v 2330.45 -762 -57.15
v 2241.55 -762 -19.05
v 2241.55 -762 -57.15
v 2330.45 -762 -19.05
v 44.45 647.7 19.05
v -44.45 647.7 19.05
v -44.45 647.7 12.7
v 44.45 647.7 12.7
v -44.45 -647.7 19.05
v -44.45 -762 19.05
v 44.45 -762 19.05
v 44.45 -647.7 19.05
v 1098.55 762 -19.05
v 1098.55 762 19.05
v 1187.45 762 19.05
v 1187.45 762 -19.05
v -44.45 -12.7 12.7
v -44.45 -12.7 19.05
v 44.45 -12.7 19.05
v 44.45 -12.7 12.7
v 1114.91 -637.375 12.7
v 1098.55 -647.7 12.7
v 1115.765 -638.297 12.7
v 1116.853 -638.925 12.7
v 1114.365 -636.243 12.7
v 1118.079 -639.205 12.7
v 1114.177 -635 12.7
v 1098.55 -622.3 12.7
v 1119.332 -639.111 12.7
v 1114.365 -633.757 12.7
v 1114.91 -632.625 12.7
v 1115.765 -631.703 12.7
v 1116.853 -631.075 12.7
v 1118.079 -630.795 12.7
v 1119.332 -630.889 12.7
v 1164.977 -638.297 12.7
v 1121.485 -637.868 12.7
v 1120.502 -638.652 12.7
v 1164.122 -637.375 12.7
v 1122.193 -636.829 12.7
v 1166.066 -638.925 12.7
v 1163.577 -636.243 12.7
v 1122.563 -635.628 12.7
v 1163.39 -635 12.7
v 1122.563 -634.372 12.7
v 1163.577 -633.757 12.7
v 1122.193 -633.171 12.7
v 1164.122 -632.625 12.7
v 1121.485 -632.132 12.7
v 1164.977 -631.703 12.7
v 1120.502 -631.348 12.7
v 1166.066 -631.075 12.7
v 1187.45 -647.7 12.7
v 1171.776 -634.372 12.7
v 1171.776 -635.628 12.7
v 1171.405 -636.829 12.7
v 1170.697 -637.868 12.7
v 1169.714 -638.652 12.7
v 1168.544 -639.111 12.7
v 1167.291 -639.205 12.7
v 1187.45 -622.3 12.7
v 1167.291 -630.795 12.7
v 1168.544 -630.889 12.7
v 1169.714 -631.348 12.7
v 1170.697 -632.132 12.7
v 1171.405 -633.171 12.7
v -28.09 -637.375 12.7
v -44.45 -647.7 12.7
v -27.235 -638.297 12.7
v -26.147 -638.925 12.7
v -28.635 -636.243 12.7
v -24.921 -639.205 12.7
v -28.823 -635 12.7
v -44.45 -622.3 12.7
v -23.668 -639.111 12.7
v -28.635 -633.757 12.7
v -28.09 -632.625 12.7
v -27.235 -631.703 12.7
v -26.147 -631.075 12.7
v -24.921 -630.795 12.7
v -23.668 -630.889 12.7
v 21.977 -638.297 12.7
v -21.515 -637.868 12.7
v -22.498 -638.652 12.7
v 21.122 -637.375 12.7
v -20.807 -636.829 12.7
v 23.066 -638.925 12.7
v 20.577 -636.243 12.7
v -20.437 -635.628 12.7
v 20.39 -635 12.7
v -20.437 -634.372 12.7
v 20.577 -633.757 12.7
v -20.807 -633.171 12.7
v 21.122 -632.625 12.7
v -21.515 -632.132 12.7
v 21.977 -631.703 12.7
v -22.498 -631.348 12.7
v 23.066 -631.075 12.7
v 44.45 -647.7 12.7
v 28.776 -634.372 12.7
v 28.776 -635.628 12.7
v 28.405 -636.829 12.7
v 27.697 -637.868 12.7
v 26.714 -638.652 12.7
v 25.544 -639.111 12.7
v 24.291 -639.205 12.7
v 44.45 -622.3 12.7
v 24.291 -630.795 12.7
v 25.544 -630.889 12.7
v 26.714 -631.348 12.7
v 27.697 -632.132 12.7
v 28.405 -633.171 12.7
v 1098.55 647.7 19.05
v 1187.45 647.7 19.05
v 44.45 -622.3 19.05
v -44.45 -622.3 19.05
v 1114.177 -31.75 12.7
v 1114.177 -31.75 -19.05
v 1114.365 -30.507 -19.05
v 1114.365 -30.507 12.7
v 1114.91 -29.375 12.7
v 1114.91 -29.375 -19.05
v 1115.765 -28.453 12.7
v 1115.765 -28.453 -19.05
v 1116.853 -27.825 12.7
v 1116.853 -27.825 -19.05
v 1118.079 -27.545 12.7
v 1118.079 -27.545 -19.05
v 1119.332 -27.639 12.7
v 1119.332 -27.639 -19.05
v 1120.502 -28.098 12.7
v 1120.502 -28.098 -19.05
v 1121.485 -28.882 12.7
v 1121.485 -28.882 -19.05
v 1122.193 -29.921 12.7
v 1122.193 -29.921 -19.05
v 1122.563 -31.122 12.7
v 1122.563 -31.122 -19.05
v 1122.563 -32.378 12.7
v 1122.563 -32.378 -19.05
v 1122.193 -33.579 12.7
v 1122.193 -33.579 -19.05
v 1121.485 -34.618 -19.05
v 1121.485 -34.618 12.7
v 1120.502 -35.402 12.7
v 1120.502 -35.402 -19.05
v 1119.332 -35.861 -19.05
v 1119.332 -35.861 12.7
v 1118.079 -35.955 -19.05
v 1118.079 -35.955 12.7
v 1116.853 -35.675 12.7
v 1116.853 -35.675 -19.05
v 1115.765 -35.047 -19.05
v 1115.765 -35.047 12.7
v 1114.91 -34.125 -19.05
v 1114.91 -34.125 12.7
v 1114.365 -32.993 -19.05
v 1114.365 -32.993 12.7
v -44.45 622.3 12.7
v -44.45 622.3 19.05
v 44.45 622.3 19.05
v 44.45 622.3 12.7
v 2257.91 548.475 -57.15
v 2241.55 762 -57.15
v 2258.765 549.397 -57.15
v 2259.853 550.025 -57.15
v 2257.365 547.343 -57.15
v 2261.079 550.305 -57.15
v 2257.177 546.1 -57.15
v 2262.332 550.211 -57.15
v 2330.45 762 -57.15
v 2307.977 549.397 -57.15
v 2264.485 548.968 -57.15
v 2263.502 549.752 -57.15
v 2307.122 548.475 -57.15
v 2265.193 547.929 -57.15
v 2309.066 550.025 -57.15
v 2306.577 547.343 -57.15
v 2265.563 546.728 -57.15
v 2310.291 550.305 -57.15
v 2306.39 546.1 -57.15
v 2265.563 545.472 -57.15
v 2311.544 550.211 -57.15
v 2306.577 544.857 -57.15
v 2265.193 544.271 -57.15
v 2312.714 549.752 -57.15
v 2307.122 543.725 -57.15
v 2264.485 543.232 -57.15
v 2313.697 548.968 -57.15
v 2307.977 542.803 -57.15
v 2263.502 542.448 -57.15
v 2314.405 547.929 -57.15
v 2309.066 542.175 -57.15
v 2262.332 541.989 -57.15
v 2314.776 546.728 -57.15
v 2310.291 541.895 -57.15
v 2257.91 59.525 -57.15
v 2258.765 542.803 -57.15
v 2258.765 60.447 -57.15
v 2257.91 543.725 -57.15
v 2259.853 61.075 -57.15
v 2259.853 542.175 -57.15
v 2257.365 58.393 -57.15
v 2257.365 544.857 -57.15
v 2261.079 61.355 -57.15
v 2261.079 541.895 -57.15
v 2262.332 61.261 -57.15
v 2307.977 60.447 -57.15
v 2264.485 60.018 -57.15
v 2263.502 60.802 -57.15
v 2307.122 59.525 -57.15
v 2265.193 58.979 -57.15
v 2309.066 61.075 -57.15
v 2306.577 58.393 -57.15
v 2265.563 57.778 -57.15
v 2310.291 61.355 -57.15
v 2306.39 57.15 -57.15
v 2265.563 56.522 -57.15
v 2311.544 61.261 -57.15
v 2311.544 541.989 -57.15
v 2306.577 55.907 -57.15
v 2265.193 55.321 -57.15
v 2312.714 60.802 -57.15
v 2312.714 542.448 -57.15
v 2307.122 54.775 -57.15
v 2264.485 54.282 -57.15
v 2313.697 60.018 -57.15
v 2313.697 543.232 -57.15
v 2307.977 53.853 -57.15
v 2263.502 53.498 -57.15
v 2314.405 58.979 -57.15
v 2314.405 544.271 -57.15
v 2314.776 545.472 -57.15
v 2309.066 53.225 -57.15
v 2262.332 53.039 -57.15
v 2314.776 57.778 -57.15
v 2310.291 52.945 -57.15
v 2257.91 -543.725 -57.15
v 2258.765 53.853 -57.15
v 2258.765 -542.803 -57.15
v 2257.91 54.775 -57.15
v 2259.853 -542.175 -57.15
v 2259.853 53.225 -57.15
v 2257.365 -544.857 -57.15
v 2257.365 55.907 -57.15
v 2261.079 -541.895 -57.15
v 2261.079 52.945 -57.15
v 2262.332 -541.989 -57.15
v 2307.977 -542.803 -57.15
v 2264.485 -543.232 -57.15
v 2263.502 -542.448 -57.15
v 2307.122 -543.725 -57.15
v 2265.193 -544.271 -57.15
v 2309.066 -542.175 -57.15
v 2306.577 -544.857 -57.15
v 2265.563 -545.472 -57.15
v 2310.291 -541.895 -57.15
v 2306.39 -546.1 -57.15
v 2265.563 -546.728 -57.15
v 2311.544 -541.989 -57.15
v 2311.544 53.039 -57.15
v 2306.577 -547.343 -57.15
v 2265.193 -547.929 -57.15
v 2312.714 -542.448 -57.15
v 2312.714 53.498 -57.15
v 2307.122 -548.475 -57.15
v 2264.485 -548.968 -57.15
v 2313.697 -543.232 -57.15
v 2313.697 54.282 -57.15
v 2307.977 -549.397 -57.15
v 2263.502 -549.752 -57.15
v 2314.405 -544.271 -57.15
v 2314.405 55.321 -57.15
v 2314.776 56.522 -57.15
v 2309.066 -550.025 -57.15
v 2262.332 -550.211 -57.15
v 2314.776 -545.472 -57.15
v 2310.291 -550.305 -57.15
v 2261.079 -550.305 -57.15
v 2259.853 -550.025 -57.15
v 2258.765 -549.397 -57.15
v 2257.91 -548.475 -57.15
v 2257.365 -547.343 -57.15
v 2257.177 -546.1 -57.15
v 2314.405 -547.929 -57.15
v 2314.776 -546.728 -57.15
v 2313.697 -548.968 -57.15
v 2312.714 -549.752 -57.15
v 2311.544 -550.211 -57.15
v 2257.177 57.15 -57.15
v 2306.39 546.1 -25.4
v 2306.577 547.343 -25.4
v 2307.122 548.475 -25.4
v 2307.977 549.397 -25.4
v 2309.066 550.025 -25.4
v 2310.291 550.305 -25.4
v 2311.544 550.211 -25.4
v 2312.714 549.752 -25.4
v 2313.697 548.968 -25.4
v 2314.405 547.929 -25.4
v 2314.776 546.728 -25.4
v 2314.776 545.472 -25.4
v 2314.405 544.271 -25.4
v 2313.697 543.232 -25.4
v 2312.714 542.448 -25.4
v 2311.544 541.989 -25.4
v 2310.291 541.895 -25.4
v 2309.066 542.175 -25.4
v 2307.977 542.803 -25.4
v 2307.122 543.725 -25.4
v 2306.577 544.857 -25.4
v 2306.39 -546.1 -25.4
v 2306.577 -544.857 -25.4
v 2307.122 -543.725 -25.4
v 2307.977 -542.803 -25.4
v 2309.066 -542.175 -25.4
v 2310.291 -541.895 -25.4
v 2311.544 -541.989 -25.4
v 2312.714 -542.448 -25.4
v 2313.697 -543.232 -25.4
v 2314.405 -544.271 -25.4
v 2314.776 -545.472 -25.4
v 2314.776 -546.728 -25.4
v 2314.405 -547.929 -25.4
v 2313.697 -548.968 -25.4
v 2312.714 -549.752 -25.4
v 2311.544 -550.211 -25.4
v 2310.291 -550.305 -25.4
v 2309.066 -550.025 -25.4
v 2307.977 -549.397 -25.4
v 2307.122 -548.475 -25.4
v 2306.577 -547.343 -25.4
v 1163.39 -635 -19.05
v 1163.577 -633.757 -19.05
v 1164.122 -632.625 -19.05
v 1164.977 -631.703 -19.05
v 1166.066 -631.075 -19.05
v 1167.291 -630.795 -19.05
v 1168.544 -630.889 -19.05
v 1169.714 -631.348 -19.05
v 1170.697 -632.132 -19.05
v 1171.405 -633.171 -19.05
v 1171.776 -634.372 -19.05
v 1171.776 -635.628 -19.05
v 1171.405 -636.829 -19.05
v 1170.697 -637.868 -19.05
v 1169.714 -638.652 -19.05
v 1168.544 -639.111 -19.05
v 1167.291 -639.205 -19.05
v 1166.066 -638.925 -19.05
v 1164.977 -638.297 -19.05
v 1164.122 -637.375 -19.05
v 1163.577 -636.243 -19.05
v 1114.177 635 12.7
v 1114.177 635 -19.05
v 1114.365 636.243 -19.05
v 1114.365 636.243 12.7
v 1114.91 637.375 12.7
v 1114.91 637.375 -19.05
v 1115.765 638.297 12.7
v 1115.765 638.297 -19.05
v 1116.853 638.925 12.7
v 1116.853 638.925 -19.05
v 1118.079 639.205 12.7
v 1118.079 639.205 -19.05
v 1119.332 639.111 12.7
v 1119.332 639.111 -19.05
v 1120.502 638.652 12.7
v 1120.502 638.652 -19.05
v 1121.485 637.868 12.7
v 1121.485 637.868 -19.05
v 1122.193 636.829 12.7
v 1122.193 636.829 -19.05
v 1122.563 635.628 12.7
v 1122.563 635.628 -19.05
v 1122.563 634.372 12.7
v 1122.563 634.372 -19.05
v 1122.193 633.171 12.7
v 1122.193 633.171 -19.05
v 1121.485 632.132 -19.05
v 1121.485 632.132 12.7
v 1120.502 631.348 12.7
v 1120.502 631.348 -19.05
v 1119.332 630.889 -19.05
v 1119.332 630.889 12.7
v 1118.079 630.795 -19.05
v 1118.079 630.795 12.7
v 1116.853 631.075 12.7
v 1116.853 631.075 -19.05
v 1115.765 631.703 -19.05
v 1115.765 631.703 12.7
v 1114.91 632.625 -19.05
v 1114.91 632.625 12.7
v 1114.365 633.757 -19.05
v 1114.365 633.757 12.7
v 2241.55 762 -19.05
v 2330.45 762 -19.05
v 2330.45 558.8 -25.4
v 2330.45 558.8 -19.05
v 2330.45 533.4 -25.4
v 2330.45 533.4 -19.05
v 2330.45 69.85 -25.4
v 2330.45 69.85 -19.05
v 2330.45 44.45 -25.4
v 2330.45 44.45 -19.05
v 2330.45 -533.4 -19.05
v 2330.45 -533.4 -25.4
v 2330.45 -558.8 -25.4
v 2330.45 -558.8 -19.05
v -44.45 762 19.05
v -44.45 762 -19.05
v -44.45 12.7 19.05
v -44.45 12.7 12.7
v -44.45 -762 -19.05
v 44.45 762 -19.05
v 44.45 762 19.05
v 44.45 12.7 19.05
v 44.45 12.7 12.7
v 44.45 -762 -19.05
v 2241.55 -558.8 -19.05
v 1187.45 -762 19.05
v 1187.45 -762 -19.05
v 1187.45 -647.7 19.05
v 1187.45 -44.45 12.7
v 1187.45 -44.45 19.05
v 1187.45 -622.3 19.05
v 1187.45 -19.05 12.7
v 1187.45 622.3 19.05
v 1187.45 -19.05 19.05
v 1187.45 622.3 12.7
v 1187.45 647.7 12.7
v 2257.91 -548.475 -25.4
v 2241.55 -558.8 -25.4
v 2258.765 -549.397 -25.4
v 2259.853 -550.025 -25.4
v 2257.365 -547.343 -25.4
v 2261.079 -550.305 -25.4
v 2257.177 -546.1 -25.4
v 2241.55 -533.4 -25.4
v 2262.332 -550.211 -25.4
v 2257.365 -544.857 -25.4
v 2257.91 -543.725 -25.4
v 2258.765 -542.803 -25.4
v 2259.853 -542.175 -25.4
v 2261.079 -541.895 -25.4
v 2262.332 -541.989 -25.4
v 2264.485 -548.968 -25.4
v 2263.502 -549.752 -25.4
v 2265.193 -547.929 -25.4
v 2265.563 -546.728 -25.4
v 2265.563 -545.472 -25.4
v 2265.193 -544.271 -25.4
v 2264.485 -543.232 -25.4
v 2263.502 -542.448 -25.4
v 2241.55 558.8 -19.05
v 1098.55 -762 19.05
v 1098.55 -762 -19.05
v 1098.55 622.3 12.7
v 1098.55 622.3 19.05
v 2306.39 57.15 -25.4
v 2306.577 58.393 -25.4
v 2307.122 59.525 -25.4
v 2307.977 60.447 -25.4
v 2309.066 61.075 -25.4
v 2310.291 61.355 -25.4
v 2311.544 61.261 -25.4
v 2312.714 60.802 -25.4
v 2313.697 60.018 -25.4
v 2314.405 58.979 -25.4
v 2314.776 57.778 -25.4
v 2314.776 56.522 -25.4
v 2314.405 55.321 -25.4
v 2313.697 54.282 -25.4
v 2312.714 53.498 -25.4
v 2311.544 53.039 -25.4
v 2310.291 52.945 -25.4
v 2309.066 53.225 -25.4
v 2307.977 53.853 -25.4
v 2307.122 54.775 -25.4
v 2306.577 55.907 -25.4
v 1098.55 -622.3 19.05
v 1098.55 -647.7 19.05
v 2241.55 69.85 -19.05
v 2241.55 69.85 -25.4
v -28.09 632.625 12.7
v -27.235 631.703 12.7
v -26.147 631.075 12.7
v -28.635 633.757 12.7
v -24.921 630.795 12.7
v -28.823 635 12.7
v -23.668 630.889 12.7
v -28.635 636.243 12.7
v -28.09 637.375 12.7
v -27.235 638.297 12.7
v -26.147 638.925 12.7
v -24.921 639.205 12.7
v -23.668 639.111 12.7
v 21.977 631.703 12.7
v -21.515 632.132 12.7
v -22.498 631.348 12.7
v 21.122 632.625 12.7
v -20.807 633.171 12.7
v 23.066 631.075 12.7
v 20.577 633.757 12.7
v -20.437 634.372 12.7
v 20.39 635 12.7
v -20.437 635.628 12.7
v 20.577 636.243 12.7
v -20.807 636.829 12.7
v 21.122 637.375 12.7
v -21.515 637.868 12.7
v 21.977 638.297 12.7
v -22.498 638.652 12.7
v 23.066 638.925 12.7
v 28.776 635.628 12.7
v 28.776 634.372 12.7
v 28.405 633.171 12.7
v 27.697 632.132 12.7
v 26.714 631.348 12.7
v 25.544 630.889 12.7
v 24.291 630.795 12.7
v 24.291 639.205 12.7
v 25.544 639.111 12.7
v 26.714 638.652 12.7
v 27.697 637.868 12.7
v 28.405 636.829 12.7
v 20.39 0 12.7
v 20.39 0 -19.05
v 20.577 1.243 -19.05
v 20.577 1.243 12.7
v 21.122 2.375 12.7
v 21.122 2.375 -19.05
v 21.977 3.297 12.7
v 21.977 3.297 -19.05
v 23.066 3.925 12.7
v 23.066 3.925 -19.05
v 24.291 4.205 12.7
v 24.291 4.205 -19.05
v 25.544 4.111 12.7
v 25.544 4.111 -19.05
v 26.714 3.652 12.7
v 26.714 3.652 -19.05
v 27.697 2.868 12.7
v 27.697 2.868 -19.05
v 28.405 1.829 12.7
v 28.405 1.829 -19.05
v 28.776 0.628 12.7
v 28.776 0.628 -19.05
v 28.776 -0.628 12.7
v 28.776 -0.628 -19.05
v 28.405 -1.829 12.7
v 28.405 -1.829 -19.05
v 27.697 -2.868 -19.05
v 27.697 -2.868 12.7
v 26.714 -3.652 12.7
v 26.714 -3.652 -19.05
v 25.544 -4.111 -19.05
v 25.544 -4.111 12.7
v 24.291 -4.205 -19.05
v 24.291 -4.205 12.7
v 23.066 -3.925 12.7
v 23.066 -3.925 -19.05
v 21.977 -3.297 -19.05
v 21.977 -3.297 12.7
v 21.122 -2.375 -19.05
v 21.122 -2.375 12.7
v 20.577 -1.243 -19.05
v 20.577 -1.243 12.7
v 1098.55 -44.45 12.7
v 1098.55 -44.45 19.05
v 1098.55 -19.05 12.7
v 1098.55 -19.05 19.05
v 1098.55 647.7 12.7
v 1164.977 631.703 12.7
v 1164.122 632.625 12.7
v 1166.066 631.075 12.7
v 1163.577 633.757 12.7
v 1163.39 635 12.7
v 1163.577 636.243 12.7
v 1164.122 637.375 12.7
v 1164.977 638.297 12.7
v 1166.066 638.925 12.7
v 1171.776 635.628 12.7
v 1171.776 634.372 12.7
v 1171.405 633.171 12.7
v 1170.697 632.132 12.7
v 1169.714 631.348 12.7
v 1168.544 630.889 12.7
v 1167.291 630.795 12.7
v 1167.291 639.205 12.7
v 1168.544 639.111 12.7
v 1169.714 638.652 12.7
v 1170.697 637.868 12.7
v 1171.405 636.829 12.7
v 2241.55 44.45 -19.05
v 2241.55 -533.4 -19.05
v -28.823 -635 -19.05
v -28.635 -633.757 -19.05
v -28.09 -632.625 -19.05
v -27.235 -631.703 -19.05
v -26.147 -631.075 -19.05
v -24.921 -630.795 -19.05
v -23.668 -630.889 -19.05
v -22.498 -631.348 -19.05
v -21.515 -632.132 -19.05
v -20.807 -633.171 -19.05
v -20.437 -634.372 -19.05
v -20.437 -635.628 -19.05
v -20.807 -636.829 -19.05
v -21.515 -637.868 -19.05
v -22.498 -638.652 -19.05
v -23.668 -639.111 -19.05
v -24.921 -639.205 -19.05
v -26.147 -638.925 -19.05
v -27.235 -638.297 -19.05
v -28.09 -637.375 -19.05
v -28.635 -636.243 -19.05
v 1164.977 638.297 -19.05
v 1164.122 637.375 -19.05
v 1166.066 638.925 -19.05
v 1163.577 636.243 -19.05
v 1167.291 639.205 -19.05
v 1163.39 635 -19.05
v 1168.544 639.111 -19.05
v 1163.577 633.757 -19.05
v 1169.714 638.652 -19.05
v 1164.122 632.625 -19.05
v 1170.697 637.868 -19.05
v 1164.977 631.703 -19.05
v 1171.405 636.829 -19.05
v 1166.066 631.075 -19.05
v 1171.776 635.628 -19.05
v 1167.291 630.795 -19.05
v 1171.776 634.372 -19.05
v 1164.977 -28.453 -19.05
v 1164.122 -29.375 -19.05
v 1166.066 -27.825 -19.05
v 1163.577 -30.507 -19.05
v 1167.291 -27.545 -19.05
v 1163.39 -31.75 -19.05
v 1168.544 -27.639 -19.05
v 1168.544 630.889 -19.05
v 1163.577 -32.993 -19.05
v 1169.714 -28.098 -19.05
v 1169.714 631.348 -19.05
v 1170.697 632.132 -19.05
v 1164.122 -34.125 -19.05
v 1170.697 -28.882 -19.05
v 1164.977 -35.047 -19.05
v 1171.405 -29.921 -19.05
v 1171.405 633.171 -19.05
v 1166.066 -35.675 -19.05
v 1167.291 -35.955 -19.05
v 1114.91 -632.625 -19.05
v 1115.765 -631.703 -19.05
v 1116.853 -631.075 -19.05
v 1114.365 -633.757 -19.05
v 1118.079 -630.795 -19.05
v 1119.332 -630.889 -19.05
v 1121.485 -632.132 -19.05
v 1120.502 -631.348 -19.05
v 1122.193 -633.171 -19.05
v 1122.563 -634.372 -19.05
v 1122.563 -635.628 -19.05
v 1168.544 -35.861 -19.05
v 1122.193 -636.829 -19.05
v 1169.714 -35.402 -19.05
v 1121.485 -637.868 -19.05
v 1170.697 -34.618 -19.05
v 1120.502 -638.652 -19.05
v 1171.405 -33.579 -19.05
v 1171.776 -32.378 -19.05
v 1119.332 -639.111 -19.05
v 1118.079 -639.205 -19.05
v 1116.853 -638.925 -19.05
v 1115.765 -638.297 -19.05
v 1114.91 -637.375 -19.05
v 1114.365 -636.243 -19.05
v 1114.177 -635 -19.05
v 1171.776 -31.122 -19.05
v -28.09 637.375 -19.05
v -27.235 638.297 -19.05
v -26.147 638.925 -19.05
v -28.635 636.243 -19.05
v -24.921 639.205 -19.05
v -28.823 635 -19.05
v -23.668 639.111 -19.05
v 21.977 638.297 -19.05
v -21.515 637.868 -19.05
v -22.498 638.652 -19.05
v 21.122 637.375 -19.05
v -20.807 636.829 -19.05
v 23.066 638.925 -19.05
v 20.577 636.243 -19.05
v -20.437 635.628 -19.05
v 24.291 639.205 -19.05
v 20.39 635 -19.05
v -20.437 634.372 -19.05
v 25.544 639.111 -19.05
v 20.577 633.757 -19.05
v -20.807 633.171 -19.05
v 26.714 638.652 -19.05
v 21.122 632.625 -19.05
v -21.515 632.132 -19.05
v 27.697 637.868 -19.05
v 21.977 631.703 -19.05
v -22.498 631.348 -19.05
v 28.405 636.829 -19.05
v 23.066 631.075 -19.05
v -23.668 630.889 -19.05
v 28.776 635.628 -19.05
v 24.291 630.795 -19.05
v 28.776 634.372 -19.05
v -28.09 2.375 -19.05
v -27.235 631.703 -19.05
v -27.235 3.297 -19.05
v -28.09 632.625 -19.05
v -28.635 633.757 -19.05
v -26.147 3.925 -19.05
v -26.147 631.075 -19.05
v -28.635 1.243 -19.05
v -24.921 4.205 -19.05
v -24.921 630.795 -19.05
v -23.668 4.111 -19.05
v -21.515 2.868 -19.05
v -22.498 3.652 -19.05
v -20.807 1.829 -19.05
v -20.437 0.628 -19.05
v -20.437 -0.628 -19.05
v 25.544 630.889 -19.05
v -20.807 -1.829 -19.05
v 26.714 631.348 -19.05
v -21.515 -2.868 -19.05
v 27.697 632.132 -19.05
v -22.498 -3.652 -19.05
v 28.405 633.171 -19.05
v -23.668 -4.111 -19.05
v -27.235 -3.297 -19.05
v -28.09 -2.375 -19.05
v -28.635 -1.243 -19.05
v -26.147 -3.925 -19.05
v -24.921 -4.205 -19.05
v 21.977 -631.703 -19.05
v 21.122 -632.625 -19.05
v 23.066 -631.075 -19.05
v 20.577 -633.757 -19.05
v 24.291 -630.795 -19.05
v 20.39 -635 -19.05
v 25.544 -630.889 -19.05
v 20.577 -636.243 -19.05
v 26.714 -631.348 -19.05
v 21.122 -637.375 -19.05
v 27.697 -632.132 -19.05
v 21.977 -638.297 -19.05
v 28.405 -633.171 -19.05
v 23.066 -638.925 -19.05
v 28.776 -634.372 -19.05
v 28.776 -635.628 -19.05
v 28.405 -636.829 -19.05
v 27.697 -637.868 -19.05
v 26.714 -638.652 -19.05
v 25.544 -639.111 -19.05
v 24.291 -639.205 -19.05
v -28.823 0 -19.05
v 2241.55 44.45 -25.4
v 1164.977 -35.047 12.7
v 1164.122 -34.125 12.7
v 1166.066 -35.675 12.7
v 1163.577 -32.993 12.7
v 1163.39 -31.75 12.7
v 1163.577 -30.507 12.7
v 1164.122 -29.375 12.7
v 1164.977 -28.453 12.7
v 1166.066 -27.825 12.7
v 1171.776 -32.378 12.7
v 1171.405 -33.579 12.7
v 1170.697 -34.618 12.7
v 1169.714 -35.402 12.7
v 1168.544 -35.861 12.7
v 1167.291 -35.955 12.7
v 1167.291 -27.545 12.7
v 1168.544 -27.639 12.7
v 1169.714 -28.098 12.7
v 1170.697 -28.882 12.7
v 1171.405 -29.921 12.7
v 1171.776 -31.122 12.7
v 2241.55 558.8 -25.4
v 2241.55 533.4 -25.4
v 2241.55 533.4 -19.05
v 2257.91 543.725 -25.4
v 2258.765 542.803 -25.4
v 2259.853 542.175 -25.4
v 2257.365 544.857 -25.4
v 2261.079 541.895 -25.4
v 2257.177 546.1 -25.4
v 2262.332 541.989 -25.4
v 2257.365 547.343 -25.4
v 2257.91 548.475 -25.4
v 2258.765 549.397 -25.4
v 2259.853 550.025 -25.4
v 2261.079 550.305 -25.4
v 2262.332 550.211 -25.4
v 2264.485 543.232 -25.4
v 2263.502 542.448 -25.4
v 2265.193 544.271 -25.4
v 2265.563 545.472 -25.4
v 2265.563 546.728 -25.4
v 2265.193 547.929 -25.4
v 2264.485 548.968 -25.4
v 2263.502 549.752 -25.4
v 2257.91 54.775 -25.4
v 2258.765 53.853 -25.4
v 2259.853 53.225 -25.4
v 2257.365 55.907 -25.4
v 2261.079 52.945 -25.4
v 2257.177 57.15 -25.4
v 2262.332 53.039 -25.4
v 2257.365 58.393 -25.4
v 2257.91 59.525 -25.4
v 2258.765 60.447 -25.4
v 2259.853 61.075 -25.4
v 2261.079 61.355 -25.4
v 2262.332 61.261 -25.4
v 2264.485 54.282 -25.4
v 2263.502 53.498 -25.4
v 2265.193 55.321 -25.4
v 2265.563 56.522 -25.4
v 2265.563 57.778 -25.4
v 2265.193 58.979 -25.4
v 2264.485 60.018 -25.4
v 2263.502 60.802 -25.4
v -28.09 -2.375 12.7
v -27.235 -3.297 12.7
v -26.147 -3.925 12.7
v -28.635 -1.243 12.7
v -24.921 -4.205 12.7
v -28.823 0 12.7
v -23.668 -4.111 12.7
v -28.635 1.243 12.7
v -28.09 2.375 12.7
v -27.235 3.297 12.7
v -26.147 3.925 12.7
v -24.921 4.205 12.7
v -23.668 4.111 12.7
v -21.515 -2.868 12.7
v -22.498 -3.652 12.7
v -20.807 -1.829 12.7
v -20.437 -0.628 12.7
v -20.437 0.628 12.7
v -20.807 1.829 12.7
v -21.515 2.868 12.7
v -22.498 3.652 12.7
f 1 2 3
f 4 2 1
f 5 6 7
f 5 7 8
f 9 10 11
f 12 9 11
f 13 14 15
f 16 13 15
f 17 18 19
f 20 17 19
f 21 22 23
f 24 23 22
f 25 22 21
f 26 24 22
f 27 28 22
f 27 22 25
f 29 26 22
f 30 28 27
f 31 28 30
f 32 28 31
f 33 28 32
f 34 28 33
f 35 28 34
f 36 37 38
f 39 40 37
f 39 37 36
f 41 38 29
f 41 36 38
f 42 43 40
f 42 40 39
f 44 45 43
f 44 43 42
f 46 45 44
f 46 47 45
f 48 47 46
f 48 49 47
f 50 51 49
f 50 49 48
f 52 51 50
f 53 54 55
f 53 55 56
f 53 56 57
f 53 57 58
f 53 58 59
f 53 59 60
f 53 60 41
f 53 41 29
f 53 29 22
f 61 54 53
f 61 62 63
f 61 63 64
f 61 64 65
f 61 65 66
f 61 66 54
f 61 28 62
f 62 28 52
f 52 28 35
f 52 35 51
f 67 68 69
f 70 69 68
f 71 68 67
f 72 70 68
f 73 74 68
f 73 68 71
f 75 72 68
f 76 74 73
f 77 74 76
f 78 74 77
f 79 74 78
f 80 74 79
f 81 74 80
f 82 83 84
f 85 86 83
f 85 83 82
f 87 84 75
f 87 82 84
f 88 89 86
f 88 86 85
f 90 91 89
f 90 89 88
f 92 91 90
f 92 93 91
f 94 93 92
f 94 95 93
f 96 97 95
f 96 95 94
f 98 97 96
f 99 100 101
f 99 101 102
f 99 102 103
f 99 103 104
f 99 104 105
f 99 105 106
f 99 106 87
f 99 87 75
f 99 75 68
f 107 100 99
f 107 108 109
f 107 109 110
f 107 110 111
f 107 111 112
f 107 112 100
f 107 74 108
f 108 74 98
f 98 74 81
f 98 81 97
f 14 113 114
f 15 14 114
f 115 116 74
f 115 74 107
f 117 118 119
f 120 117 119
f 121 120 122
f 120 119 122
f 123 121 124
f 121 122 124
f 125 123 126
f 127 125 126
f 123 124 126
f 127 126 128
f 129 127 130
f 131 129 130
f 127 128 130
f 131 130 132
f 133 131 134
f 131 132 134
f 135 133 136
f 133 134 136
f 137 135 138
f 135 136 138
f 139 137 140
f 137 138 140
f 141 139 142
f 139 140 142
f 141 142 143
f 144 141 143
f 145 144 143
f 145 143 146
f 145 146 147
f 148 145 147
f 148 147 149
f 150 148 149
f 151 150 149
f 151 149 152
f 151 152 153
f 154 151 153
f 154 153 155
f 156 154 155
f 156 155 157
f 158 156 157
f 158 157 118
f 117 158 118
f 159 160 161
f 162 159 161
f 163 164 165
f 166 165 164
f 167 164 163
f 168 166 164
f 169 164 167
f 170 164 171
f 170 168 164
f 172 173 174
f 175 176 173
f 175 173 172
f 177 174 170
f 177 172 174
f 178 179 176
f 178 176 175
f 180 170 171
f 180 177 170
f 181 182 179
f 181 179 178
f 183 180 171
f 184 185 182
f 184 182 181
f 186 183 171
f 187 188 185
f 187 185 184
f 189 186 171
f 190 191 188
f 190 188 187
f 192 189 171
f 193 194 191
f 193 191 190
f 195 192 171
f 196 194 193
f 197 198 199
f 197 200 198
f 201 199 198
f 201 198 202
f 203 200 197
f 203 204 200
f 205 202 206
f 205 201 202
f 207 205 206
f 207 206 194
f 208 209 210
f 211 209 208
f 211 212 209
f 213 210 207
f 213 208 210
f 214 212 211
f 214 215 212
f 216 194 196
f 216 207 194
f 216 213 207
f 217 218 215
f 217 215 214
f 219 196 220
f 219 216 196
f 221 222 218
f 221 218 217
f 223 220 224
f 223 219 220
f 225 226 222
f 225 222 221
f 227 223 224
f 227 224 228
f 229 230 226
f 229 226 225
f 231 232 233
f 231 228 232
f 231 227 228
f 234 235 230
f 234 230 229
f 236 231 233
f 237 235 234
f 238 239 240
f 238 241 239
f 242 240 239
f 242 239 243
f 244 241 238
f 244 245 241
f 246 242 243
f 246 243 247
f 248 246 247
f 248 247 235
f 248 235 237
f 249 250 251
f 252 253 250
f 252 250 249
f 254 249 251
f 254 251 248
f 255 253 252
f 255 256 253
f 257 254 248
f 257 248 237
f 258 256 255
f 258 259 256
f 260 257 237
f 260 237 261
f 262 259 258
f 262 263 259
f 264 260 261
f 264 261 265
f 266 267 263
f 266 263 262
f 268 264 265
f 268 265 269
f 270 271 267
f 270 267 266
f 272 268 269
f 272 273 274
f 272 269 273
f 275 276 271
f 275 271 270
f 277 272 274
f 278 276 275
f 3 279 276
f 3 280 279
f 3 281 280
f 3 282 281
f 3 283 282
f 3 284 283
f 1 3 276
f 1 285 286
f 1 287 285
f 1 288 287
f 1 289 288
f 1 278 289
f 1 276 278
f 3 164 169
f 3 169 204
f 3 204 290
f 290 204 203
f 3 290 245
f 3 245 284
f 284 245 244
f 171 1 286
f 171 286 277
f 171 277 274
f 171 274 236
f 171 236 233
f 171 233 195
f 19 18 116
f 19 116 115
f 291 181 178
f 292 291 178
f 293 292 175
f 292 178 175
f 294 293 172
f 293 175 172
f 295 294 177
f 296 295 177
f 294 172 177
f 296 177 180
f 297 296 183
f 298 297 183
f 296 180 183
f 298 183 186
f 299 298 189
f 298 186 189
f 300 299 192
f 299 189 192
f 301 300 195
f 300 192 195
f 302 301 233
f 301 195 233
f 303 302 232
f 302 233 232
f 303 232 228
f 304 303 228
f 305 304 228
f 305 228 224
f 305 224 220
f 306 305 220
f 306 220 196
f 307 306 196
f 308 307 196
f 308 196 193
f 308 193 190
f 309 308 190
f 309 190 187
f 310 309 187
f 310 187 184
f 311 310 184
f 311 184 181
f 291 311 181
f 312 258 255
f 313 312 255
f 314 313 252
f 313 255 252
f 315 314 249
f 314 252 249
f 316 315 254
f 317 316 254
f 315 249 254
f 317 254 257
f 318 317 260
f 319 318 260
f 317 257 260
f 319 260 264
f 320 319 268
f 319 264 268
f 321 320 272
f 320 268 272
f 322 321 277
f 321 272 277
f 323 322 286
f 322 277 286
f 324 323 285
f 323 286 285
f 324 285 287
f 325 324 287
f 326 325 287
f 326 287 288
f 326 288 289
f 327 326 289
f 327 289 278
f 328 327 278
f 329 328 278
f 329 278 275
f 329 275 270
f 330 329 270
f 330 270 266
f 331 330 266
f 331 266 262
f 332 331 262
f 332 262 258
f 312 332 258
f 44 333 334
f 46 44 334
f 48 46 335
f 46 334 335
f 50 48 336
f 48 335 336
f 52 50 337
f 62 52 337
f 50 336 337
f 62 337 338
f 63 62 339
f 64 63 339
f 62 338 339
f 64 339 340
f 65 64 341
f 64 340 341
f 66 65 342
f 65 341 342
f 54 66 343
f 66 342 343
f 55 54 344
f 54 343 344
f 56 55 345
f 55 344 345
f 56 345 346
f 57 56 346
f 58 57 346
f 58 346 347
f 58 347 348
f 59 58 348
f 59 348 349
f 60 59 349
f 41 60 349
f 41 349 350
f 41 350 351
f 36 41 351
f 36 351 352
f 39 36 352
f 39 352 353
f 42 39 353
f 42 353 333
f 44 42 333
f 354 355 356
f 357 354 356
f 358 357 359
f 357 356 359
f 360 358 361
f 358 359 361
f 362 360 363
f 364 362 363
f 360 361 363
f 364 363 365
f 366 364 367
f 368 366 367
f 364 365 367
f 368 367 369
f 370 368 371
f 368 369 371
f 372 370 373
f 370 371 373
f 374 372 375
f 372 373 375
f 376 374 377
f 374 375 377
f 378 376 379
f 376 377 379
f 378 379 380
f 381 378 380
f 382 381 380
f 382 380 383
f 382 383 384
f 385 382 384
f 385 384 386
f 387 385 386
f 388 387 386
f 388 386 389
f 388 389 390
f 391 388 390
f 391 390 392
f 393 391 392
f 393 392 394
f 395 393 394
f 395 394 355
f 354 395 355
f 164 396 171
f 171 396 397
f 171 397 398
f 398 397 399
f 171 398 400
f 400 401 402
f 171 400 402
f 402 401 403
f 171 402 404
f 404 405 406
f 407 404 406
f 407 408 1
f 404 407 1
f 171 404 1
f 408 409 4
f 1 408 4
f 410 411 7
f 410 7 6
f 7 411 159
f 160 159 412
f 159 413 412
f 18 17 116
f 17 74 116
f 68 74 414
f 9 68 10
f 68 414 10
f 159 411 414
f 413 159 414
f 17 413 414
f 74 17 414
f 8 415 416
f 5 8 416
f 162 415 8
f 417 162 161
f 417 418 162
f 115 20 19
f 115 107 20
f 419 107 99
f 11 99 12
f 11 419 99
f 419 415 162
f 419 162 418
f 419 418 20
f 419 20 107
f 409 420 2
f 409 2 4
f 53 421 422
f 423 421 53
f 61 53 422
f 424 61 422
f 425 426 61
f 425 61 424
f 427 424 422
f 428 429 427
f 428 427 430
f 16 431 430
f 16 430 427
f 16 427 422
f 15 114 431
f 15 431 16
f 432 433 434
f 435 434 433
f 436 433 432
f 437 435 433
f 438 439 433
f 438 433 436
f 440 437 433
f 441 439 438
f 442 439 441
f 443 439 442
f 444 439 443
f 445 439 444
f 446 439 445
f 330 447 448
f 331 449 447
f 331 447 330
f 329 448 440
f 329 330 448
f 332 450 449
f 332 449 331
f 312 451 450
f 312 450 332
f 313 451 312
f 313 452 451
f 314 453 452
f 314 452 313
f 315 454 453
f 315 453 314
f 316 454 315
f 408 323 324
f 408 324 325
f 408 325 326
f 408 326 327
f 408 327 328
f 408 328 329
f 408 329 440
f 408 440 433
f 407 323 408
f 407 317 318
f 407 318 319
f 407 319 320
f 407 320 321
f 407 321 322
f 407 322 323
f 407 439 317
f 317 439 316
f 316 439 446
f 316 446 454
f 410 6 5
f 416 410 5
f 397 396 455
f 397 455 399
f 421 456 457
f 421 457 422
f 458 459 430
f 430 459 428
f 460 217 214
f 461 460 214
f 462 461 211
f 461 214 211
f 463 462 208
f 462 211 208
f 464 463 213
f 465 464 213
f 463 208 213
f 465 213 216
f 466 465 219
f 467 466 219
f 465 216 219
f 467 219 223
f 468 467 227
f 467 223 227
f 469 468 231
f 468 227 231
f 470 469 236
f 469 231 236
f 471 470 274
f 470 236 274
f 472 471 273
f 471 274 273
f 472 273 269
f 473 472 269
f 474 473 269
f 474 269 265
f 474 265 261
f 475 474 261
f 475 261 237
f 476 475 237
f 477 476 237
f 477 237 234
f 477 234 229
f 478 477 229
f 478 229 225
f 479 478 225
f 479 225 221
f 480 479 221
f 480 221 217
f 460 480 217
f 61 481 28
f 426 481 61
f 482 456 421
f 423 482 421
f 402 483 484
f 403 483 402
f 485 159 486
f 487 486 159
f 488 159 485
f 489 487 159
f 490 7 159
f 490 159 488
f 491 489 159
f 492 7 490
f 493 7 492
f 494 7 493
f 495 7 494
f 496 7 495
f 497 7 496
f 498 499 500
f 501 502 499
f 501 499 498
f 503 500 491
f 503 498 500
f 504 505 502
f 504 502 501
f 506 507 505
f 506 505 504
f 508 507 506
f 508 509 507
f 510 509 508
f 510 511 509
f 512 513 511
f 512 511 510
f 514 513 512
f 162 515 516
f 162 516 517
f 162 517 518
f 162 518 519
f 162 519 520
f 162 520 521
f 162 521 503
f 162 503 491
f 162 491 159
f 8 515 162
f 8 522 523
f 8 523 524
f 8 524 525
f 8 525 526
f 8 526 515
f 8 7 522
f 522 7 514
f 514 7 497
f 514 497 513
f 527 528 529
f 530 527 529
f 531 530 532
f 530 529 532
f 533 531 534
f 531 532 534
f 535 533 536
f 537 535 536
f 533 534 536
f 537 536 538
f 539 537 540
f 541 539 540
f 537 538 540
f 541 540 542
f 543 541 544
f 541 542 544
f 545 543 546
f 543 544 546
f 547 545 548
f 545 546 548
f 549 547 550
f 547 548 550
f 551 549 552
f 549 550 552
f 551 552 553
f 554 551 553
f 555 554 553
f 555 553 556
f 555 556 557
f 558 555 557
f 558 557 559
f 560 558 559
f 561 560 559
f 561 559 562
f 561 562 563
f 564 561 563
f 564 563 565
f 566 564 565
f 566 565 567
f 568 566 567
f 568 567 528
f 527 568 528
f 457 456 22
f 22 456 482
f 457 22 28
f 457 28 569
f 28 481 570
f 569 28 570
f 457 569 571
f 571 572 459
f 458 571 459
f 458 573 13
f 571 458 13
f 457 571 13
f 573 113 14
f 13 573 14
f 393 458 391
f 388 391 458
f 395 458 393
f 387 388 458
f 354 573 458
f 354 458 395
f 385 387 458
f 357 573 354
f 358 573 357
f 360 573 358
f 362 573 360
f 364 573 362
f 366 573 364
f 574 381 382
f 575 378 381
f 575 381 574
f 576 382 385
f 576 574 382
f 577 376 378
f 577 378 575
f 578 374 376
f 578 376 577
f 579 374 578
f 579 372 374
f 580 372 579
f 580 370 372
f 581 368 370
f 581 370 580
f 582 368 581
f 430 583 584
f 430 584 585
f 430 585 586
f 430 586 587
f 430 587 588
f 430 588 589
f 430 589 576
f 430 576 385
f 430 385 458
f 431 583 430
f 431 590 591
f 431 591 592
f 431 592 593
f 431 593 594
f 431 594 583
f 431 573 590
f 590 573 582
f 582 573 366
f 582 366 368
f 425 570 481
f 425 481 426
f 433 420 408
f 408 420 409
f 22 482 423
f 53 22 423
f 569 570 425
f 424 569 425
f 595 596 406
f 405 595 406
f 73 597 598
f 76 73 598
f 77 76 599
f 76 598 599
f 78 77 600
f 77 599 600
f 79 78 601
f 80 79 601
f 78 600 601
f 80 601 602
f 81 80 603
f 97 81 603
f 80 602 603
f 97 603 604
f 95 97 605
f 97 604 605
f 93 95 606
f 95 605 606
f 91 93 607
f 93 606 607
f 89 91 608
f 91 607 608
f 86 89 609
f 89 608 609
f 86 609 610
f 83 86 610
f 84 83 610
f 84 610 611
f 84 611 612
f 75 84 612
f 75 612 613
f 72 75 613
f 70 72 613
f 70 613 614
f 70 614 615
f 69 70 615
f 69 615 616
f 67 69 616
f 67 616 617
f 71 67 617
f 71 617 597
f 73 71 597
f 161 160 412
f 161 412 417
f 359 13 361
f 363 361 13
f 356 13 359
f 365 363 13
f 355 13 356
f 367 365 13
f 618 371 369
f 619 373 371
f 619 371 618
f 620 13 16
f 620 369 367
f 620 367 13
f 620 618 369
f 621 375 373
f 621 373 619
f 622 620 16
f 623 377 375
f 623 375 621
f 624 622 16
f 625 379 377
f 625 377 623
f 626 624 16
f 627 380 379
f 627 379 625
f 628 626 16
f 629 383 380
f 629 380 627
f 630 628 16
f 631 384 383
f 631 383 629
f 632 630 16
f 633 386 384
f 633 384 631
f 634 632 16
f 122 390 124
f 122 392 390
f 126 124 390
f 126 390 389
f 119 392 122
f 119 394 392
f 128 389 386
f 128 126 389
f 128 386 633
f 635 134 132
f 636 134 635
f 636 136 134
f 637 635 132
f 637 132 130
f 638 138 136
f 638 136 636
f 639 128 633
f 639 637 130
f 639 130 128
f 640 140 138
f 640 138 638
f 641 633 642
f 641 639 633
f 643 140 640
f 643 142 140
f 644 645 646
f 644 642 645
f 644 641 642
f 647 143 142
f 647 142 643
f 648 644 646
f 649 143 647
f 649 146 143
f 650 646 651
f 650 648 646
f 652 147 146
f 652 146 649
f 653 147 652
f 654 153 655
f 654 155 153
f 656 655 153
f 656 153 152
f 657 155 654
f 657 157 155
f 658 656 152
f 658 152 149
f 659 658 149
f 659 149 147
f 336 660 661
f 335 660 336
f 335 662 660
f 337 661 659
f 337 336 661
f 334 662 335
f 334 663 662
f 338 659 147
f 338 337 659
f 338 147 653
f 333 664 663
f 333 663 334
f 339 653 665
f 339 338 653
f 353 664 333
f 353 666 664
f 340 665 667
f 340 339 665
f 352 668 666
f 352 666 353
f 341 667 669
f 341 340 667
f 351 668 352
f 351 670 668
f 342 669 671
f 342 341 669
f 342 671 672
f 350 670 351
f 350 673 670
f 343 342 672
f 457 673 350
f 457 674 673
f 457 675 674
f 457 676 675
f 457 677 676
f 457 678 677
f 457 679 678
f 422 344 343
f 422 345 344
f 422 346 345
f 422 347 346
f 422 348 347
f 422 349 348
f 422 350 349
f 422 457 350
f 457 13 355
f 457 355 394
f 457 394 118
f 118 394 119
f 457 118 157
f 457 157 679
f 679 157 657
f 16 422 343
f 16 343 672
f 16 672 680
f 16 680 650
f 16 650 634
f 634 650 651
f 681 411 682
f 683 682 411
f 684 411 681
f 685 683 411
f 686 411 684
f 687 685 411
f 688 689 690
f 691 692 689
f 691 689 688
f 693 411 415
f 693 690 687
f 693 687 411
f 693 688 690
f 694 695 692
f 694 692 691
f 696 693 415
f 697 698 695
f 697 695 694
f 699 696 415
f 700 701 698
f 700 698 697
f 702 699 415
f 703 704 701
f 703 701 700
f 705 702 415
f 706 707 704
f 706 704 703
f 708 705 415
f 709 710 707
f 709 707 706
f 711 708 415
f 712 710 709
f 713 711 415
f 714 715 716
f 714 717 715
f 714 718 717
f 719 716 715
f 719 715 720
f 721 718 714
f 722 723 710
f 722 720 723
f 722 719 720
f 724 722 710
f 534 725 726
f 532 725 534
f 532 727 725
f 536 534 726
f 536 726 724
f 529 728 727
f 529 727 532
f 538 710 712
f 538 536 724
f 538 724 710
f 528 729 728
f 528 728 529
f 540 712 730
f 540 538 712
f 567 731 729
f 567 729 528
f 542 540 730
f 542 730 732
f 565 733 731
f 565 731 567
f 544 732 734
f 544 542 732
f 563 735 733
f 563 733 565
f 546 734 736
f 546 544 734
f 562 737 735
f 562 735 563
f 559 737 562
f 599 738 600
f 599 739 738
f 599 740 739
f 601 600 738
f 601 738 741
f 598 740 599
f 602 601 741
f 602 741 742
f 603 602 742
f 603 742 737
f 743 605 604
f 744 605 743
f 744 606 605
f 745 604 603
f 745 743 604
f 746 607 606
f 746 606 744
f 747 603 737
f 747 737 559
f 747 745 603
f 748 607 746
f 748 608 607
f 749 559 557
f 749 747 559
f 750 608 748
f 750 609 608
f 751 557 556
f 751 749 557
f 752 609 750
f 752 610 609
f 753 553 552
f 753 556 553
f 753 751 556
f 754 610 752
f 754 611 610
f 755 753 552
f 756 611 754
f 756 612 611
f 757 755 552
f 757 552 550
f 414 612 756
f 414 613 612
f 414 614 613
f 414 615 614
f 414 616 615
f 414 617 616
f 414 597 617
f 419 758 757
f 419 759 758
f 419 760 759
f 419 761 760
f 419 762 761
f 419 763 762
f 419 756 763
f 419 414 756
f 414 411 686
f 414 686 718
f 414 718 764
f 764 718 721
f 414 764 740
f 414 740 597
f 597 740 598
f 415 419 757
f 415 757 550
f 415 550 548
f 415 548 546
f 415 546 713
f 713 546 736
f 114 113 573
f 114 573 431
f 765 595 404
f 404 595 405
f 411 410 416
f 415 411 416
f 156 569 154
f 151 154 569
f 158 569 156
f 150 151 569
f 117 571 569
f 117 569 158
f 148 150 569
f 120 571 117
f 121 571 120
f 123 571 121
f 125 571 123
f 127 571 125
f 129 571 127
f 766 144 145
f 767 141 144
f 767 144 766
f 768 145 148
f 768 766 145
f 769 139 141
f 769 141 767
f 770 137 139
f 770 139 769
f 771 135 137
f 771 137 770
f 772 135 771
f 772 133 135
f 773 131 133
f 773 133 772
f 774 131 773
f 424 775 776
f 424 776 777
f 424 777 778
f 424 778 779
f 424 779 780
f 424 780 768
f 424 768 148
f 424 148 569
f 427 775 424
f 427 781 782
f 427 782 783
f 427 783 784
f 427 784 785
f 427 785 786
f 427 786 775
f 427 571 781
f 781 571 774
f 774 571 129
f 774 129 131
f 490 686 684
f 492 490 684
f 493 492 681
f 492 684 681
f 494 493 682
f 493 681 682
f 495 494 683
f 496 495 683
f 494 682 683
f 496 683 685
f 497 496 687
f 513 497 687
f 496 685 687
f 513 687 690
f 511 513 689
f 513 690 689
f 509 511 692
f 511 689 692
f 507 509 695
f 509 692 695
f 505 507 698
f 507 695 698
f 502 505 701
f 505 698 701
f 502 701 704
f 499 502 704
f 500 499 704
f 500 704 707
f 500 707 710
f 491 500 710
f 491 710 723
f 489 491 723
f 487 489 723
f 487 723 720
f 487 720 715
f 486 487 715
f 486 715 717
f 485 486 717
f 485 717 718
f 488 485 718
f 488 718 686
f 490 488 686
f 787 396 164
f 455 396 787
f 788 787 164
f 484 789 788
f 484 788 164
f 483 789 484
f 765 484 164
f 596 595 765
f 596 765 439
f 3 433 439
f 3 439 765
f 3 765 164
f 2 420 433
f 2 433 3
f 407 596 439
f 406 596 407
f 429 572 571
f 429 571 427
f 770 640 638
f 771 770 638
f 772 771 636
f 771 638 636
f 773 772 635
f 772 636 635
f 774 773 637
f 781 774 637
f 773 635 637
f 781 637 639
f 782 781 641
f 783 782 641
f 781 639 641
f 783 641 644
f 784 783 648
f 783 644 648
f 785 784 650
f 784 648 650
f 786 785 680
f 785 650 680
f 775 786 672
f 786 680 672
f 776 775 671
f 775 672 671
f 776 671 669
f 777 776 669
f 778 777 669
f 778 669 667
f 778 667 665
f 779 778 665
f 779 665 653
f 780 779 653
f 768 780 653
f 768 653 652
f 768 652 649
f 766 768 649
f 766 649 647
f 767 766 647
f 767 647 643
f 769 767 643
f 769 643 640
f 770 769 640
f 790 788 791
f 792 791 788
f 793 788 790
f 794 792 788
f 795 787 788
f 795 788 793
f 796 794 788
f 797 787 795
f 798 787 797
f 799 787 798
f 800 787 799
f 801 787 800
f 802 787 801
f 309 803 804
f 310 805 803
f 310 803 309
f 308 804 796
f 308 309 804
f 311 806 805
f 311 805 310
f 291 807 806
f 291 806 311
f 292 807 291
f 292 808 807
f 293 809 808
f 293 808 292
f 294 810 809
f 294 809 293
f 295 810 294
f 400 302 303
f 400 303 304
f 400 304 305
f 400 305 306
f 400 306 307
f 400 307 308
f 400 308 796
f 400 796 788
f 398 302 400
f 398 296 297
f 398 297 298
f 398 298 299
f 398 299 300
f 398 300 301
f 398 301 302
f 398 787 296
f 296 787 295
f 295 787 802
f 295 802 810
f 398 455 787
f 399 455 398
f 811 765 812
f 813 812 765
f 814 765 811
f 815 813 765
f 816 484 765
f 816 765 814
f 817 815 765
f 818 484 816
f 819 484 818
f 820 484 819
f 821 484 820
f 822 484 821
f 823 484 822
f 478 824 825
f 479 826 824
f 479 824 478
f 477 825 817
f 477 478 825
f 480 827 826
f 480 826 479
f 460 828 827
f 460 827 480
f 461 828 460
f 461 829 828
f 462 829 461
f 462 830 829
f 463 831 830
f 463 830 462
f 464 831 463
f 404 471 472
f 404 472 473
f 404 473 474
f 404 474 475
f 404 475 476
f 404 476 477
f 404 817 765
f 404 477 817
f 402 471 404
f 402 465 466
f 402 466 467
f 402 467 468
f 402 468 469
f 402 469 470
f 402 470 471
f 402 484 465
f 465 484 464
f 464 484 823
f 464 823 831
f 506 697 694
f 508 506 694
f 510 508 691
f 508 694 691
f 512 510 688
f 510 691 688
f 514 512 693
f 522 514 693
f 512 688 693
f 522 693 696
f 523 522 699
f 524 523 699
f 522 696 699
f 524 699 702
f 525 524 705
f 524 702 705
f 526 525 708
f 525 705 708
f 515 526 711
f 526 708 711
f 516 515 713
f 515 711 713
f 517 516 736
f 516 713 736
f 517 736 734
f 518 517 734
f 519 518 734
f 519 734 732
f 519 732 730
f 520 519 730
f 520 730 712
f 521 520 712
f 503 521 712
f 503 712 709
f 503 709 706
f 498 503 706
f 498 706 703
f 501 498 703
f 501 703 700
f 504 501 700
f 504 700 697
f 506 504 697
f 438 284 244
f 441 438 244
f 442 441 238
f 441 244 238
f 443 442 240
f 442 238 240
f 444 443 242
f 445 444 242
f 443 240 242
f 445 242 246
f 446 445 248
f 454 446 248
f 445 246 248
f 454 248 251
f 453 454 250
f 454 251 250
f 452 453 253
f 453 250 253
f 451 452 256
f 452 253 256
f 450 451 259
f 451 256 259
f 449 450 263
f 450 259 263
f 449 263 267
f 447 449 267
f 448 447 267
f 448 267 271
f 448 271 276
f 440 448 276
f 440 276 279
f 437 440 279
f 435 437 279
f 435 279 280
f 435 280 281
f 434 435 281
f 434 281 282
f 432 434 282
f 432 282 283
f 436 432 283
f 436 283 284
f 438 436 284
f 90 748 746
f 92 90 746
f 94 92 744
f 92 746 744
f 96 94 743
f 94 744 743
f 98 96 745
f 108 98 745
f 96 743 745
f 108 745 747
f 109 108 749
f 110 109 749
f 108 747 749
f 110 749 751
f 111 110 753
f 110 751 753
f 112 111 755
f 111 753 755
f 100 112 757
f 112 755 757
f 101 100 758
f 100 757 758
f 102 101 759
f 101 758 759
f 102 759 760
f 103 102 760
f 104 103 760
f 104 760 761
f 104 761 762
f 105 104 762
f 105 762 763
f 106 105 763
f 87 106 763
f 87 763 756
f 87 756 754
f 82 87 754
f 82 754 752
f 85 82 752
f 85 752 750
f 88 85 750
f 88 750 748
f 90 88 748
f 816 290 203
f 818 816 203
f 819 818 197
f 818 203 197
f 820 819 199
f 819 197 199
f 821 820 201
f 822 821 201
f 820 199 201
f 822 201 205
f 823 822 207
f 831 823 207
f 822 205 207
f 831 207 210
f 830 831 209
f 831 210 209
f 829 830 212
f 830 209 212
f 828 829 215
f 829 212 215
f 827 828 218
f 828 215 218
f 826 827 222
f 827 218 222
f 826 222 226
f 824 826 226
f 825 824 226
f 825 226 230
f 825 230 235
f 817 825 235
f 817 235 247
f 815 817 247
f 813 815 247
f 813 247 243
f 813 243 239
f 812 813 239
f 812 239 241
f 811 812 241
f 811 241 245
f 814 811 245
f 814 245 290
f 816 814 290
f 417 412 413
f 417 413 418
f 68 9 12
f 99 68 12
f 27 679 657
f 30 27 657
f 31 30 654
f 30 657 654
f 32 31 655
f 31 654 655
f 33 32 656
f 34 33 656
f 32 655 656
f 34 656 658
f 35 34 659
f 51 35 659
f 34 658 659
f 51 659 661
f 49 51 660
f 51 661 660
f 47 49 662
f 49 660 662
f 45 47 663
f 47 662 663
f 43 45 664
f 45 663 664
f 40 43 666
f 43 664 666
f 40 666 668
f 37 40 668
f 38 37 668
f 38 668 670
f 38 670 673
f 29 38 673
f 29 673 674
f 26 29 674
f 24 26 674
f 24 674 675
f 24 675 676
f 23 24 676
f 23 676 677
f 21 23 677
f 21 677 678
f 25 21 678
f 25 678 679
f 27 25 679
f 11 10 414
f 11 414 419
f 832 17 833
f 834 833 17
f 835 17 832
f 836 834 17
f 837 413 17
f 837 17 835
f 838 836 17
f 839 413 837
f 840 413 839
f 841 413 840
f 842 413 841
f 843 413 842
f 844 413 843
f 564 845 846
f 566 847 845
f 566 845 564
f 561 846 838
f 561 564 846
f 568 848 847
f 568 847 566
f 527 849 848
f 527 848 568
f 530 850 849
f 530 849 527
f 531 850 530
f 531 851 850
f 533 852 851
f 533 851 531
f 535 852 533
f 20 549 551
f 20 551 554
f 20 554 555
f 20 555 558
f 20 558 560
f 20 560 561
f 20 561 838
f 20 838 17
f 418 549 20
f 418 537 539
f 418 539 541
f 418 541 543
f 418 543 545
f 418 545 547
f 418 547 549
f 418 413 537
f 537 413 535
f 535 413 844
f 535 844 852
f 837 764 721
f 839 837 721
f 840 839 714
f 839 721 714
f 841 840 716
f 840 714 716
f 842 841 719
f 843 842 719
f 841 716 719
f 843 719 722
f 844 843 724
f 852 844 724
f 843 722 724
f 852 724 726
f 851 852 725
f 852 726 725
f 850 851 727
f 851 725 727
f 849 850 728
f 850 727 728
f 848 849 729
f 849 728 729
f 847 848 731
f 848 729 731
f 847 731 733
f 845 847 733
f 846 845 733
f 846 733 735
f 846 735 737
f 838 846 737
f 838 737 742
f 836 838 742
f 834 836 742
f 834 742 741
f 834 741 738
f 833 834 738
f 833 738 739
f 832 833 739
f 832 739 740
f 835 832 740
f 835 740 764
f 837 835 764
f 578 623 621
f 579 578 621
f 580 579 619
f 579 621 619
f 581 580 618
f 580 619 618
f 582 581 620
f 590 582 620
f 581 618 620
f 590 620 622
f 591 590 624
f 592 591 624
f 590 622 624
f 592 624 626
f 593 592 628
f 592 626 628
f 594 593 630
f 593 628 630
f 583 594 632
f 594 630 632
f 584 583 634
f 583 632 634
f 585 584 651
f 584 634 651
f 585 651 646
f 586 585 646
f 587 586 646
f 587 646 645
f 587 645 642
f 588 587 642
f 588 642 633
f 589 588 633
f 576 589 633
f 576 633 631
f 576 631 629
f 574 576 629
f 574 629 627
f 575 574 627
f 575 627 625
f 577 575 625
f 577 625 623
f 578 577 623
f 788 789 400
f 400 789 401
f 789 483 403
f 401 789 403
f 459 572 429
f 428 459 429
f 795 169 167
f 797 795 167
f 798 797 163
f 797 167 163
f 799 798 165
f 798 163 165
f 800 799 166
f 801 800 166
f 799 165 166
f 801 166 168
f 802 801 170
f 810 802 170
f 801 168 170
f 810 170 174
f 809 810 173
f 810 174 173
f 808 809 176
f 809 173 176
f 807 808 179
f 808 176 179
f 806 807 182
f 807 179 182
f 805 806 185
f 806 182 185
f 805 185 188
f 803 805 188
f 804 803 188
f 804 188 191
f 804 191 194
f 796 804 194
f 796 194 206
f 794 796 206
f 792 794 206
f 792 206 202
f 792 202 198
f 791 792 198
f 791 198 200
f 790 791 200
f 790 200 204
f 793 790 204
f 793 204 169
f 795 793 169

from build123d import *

# Parameters (mm, degrees)
F0_W      = 88.9
F0_H      = 38.1
F1_DEPTH  = 762
F2_W      = 88.9
F2_H      = 25.4
F3_DEPTH  = 6.35
F4_D      = 8.4328
F6_W      = 88.9
F6_H      = 1524
F7_DEPTH  = 38.1
F8_W      = 88.9
F8_H      = 25.4
F9_DEPTH  = 6.35
F10_D     = 8.4328
F11_W     = 88.9
F11_H     = 25.4
F12_DEPTH = 38.1
F14_W     = 88.9
F14_H     = 25.4
F15_DEPTH = 6.35
F16_D     = 8.4328


with BuildPart() as f1:
    # F0 (on Front) → F1 (new body, symmetric)
    with BuildSketch(Plane.XZ):
        Rectangle(F0_W, F0_H)
    extrude(amount=F1_DEPTH, both=True)

    # F2 (on face) → F3 (cut)
    with BuildSketch(Plane.XY.offset(19.05)):
        with Locations((0, 635)):
            Rectangle(F2_W, F2_H)
        with Locations((0, -635)):
            Rectangle(F2_W, F2_H)
        Rectangle(F2_W, F2_H)
    extrude(amount=-F3_DEPTH, mode=Mode.SUBTRACT)

    # F4 (through all)
    with Locations(Plane.XY.offset(19.05)):
        with Locations((-24.60625, 635), (24.60625, 635), (-24.60625, 0), (24.60625, 0), (-24.60625, -635), (24.60625, -635)):
            Hole(F4_D / 2)


with BuildPart() as f5_1:
    # F5: copy of F1
    add(f1.part.moved(Location((1143, 0, 0))))


with BuildPart() as f7:
    # F6 (on face) → F7 (new body)
    with BuildSketch(Plane(origin=(0, 0, -19.05), x_dir=(1, 0, 0), z_dir=(0, 0, -1))):
        with Locations((2286, 0)):
            Rectangle(F6_W, F6_H)
    extrude(amount=F7_DEPTH)

    # F8 (on face) → F9 (cut)
    with BuildSketch(Plane.XY.offset(-19.05)):
        with Locations((2286, 546.1)):
            Rectangle(F8_W, F8_H)
        with Locations((2286, 57.15)):
            Rectangle(F8_W, F8_H)
        with Locations((2286, -546.1)):
            Rectangle(F8_W, F8_H)
    extrude(amount=-F9_DEPTH, mode=Mode.SUBTRACT)

    # F10 (through all)
    with Locations(Plane.XY.offset(-19.05)):
        with Locations((2261.39375, -546.1), (2310.60625, -546.1), (2261.39375, 57.15), (2310.60625, 57.15), (2261.39375, 546.1), (2310.60625, 546.1)):
            Hole(F10_D / 2)


with BuildPart() as f12:
    # F11 (on face) → F12 (new body, through all)
    with BuildSketch(Plane.XY.offset(19.05)):
        with Locations((1143, 0)):
            Rectangle(F11_W, F11_H)
    extrude(amount=-F12_DEPTH)


with BuildPart() as f5_1_1:
    add(f5_1.part)

    # F13: union F12
    add(f12.part)

    # F14 (on face) → F15 (cut)
    with BuildSketch(Plane.XY.offset(19.05)):
        with Locations((1143, -31.75)):
            Rectangle(F14_W, F14_H)
    extrude(amount=-F15_DEPTH, mode=Mode.SUBTRACT)

    # F16 (through all)
    with Locations(Plane.XY.offset(19.05)):
        with Locations((1118.39375, -31.75), (1167.60625, -31.75)):
            Hole(F16_D / 2)


solid = Compound([f1.part, f7.part, f5_1_1.part])
